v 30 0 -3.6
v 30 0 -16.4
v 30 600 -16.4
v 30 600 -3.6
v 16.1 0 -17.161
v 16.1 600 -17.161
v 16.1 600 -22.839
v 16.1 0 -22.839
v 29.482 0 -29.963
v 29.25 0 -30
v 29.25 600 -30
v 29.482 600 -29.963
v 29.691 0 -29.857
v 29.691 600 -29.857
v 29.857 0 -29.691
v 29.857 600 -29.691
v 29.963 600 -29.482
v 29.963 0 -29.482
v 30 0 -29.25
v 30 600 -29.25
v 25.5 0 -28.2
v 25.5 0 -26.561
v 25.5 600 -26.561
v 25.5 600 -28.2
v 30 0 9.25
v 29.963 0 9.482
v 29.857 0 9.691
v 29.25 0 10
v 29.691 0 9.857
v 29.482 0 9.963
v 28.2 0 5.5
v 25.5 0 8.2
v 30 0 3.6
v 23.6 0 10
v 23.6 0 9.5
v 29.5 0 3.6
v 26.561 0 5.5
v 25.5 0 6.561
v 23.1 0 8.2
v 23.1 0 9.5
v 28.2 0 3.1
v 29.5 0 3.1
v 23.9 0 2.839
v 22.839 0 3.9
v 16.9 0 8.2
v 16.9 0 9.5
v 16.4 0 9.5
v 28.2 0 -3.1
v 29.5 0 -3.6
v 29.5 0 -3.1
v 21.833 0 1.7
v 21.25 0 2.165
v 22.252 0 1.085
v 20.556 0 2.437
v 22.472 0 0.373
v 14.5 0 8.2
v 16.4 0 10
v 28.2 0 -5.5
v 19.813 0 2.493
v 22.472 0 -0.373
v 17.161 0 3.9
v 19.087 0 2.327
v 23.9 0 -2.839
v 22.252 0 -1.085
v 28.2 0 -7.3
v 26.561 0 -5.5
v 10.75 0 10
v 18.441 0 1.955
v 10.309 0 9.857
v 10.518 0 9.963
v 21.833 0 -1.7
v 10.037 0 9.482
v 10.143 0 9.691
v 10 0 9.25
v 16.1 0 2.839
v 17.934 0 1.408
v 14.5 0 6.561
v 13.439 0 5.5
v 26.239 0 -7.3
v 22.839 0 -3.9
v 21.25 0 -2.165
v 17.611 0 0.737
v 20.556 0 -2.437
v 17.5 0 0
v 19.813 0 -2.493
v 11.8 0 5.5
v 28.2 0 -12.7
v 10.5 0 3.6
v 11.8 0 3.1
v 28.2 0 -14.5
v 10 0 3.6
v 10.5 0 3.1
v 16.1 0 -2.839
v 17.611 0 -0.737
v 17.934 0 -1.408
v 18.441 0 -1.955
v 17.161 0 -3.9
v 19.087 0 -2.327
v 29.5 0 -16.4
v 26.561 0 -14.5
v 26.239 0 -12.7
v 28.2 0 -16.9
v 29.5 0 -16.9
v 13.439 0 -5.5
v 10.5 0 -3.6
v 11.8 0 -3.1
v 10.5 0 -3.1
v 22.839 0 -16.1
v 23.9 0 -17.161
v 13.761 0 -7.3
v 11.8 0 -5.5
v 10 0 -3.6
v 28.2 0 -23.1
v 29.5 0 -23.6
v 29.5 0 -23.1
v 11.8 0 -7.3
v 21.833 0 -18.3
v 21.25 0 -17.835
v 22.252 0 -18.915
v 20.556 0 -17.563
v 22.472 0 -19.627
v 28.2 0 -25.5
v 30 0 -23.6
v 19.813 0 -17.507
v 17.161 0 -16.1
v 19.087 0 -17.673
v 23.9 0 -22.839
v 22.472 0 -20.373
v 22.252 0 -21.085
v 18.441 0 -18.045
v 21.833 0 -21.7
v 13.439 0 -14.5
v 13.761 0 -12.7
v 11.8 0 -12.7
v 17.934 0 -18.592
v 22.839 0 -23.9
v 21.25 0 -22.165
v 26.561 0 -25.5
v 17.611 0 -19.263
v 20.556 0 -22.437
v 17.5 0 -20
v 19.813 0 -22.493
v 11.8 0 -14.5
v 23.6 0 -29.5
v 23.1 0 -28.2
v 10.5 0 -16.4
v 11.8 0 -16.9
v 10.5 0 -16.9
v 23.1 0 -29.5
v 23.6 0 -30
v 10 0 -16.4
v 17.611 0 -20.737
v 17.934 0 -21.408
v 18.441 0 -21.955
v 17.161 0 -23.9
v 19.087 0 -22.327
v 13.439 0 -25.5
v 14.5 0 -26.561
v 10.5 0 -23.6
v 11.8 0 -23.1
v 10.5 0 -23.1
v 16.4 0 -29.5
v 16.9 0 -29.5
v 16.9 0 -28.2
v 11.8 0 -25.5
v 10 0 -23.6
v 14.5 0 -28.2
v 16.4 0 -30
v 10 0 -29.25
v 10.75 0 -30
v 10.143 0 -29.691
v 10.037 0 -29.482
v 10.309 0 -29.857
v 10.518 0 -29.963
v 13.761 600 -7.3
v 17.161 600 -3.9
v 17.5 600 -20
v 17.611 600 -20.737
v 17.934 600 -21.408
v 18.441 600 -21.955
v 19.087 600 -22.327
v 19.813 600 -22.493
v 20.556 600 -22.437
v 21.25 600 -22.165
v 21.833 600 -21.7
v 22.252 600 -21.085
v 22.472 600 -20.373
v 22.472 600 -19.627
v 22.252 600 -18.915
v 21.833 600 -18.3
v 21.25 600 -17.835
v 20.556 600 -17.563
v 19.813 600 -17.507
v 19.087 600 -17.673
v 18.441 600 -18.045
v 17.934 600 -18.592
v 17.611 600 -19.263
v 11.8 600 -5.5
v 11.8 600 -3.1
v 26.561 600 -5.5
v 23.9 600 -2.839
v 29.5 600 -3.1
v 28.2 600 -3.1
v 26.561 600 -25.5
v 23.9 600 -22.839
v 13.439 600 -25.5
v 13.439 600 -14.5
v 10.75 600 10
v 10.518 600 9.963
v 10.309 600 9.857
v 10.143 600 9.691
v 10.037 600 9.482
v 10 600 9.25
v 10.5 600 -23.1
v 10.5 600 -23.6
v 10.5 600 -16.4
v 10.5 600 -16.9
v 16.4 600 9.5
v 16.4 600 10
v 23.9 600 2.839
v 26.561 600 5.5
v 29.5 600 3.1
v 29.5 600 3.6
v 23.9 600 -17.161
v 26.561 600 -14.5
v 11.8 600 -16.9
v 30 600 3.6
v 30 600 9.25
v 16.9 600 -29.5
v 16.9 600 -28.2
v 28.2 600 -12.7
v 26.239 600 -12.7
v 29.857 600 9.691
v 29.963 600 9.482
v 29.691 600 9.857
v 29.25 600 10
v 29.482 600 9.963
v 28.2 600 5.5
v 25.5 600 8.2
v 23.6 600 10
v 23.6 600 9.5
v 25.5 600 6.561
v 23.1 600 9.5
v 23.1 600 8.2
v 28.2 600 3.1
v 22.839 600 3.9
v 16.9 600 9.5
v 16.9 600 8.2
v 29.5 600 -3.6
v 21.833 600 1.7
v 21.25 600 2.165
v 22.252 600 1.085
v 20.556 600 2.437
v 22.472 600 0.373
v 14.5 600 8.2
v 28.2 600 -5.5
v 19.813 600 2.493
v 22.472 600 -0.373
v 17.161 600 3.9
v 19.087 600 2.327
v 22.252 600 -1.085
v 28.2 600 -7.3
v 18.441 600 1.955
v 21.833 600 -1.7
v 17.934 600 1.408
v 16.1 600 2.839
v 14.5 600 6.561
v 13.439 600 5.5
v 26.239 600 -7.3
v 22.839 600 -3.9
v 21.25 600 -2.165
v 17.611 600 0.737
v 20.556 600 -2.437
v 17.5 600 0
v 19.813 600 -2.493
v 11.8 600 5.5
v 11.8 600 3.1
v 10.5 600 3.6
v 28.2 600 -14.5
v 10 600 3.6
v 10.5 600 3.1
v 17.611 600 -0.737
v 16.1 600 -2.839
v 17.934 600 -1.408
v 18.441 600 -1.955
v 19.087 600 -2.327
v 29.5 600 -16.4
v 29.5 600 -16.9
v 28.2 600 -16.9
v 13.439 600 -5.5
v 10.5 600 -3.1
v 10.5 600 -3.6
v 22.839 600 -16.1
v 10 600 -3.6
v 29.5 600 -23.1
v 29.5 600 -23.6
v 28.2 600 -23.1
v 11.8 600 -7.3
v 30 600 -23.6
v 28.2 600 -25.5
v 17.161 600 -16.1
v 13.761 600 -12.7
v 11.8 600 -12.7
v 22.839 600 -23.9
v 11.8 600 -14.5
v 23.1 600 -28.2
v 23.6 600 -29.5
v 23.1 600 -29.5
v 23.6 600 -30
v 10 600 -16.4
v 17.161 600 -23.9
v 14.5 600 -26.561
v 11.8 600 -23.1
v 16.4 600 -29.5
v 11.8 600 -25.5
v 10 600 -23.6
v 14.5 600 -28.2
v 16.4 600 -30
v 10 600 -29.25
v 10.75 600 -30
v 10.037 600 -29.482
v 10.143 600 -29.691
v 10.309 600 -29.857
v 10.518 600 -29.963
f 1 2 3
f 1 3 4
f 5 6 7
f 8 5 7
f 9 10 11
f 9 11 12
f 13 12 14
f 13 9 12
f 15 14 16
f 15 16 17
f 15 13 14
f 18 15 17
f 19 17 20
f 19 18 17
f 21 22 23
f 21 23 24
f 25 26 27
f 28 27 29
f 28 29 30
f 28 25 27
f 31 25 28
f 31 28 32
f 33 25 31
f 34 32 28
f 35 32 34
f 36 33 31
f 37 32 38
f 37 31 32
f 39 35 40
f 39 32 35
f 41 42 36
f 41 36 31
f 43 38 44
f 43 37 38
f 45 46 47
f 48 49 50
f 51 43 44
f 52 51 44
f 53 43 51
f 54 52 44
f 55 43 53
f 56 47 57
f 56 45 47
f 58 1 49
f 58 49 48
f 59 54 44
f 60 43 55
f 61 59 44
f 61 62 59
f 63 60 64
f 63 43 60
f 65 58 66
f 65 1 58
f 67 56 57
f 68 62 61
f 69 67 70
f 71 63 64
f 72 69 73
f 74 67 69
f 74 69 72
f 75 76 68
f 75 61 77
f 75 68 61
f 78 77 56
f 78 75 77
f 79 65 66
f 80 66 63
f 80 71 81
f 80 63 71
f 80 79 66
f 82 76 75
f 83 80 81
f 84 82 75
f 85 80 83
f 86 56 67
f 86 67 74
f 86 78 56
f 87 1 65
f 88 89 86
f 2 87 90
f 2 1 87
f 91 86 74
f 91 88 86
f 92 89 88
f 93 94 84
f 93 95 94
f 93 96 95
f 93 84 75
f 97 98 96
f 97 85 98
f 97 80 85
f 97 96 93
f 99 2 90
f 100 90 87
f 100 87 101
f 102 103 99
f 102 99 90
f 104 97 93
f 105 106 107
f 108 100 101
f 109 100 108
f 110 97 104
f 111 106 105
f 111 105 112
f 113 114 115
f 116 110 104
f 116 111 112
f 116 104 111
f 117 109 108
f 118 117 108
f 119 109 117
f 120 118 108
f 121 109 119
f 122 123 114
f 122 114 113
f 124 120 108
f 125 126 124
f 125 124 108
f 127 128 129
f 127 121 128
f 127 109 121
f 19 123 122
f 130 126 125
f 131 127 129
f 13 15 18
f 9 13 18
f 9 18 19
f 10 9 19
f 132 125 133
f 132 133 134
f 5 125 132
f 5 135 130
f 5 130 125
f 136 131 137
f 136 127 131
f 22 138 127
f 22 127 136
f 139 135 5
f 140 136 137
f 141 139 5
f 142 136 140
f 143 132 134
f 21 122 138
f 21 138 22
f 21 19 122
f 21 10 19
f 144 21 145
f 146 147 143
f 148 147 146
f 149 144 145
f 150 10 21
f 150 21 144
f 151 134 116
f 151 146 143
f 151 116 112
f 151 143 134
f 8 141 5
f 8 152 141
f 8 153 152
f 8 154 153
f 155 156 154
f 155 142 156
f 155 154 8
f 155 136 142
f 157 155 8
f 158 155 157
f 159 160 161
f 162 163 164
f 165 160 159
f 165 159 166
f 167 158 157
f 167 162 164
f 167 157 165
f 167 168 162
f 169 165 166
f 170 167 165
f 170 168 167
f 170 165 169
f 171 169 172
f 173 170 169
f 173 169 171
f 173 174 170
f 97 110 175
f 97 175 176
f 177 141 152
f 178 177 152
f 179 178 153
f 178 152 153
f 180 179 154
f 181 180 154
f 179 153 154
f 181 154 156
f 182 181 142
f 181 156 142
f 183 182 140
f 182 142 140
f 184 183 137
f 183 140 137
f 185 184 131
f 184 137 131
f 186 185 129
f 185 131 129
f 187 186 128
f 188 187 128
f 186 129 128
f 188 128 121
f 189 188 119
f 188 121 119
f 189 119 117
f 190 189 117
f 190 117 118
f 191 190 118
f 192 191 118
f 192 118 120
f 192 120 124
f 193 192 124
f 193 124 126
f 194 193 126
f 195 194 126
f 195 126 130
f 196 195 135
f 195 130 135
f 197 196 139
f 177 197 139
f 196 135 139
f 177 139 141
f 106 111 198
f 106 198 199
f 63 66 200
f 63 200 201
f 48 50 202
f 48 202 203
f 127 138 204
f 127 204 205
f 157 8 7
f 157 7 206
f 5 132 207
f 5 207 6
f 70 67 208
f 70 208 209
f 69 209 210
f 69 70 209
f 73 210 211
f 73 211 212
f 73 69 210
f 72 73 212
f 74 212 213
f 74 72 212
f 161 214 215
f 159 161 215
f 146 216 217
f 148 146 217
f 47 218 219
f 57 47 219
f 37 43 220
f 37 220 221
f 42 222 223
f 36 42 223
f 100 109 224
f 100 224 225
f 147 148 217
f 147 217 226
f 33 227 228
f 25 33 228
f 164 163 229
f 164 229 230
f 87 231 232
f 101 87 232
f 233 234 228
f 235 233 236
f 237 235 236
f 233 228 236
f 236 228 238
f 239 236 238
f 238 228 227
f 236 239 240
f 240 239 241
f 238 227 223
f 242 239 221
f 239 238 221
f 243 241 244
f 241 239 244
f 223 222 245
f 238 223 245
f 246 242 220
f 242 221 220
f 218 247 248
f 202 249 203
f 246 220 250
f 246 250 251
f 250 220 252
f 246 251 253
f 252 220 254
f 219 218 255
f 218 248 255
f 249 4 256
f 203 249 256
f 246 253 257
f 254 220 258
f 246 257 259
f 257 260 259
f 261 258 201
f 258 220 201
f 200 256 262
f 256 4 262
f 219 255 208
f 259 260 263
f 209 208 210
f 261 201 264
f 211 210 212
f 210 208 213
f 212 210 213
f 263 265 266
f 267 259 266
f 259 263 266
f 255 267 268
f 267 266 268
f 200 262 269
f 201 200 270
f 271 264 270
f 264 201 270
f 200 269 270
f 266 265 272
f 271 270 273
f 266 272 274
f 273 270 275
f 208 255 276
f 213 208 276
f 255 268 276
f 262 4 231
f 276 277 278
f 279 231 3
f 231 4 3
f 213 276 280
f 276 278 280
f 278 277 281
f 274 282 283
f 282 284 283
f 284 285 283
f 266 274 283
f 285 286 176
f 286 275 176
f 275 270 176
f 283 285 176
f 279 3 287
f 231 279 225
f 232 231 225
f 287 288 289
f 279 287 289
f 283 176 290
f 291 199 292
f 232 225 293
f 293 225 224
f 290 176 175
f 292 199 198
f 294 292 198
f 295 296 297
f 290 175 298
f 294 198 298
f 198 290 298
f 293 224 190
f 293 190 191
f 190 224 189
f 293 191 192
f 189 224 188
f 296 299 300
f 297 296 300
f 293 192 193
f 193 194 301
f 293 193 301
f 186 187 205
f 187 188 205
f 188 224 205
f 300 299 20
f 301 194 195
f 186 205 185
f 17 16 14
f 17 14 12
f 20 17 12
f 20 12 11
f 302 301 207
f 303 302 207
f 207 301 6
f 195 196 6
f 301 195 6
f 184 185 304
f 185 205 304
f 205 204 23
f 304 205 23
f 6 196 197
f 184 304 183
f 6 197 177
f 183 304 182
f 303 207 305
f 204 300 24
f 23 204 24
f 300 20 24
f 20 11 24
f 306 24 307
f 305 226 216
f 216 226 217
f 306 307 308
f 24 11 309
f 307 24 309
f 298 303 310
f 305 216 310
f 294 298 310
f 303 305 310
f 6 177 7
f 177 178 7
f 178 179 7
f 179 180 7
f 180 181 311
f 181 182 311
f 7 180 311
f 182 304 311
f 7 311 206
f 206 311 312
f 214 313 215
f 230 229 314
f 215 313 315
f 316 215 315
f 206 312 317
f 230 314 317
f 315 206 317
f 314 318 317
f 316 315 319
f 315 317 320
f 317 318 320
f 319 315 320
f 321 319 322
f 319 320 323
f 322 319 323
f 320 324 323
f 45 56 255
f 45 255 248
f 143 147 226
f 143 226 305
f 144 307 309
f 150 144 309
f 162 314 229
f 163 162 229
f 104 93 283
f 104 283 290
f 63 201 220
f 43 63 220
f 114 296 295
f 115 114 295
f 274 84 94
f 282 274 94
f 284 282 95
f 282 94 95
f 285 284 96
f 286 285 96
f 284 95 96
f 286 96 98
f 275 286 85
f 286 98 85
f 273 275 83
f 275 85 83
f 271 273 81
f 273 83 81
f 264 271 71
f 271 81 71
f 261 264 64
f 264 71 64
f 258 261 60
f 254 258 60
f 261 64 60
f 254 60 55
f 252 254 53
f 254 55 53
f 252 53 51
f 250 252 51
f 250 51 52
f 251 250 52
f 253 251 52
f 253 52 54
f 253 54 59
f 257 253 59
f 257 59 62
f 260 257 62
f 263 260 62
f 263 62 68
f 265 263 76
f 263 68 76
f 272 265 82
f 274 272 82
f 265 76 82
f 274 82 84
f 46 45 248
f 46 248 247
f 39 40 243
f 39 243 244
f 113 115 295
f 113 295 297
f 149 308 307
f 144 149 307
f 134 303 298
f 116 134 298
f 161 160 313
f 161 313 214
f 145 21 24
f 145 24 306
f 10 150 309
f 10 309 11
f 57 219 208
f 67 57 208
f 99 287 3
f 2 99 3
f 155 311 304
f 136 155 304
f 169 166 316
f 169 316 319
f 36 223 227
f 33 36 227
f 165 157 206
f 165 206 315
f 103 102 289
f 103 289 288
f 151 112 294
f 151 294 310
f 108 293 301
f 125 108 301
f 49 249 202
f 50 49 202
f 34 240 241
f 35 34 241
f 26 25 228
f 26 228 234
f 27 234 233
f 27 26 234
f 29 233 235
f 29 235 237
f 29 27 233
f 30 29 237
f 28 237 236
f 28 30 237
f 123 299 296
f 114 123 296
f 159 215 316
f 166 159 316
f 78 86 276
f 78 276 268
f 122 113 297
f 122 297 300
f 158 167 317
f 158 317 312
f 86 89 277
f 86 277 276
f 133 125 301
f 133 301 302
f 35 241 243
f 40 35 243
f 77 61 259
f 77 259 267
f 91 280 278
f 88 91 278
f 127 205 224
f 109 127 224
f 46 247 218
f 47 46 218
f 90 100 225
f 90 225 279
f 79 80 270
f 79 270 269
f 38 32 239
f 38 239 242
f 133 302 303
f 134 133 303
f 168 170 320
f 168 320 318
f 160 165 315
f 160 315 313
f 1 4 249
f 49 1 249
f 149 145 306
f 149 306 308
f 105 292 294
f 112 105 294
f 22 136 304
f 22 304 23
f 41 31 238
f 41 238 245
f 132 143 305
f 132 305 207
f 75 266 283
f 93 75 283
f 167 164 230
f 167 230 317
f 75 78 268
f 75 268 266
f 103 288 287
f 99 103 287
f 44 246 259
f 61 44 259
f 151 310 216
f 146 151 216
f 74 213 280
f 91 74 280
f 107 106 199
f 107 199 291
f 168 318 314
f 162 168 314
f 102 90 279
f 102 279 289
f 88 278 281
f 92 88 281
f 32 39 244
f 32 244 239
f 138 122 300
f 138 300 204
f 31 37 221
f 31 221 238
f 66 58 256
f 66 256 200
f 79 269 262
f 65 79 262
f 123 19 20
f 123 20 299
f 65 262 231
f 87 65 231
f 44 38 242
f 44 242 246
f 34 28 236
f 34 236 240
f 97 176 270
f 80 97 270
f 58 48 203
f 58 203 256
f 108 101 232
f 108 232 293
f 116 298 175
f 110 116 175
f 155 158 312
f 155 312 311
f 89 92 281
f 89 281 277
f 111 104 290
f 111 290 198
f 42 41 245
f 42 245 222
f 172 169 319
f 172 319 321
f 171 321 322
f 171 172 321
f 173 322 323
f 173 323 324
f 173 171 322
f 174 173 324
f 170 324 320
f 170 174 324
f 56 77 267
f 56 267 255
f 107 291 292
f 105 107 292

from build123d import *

# Parameters (mm, degrees)
BOSS_EXTRUDE2_DEPTH = 600


with BuildPart() as part:
    # Sketch1 → Boss-Extrude2 (new body)
    with BuildSketch(Plane(origin=(0, 0, 0), x_dir=(1, 0, 0), z_dir=(0, 1, 0))):
        with BuildLine():
            Line((23.9, 20), (23.9, 17.160660172))
            Line((23.9, 17.160660172), (26.560660172, 14.5))
            Line((26.560660172, 14.5), (28.2, 14.5))
            Line((28.2, 14.5), (28.2, 16.9))
            Line((28.2, 16.9), (29.5, 16.9))
            Line((29.5, 16.9), (29.5, 16.4))
            Line((29.5, 16.4), (30, 16.4))
            Line((30, 16.4), (30, 10.75))
            Line((30, 10.75), (30, 9.25))
            Line((30, 9.25), (30, 3.6))
            Line((30, 3.6), (29.5, 3.6))
            Line((29.5, 3.6), (29.5, 3.1))
            Line((29.5, 3.1), (28.2, 3.1))
            Line((28.2, 3.1), (28.2, 5.5))
            Line((28.2, 5.5), (26.560660172, 5.5))
            Line((26.560660172, 5.5), (23.9, 2.839339828))
            Line((23.9, 2.839339828), (23.9, 0))
            Line((23.9, 0), (23.9, -2.839339828))
            Line((23.9, -2.839339828), (26.560660172, -5.5))
            Line((26.560660172, -5.5), (28.2, -5.5))
            Line((28.2, -5.5), (28.2, -3.1))
            Line((28.2, -3.1), (29.5, -3.1))
            Line((29.5, -3.1), (29.5, -3.6))
            Line((29.5, -3.6), (30, -3.6))
            Line((30, -3.6), (30, -9.25))
            ThreePointArc((30, -9.25), (29.780330086, -9.780330086), (29.25, -10))
            Line((29.25, -10), (25.5, -10))
            Line((25.5, -10), (23.6, -10))
            Line((23.6, -10), (23.6, -9.5))
            Line((23.6, -9.5), (23.1, -9.5))
            Line((23.1, -9.5), (23.1, -8.2))
            Line((23.1, -8.2), (25.5, -8.2))
            Line((25.5, -8.2), (25.5, -6.560660172))
            Line((25.5, -6.560660172), (22.839339828, -3.9))
            Line((22.839339828, -3.9), (17.160660172, -3.9))
            Line((17.160660172, -3.9), (14.5, -6.560660172))
            Line((14.5, -6.560660172), (14.5, -8.2))
            Line((14.5, -8.2), (16.9, -8.2))
            Line((16.9, -8.2), (16.9, -9.5))
            Line((16.9, -9.5), (16.4, -9.5))
            Line((16.4, -9.5), (16.4, -10))
            Line((16.4, -10), (14.5, -10))
            Line((14.5, -10), (10.75, -10))
            ThreePointArc((10.75, -10), (10.219669914, -9.780330086), (10, -9.25))
            Line((10, -9.25), (10, -3.6))
            Line((10, -3.6), (10.5, -3.6))
            Line((10.5, -3.6), (10.5, -3.1))
            Line((10.5, -3.1), (11.8, -3.1))
            Line((11.8, -3.1), (11.8, -5.5))
            Line((11.8, -5.5), (13.439339828, -5.5))
            Line((13.439339828, -5.5), (16.1, -2.839339828))
            Line((16.1, -2.839339828), (16.1, 0))
            Line((16.1, 0), (16.1, 2.839339828))
            Line((16.1, 2.839339828), (13.439339828, 5.5))
            Line((13.439339828, 5.5), (11.8, 5.5))
            Line((11.8, 5.5), (11.8, 3.1))
            Line((11.8, 3.1), (10.5, 3.1))
            Line((10.5, 3.1), (10.5, 3.6))
            Line((10.5, 3.6), (10, 3.6))
            Line((10, 3.6), (10, 9.25))
            Line((10, 9.25), (10, 10.75))
            Line((10, 10.75), (10, 16.4))
            Line((10, 16.4), (10.5, 16.4))
            Line((10.5, 16.4), (10.5, 16.9))
            Line((10.5, 16.9), (11.8, 16.9))
            Line((11.8, 16.9), (11.8, 14.5))
            Line((11.8, 14.5), (13.439339828, 14.5))
            Line((13.439339828, 14.5), (16.1, 17.160660172))
            Line((16.1, 17.160660172), (16.1, 20))
            Line((16.1, 20), (16.1, 22.839339828))
            Line((16.1, 22.839339828), (13.439339828, 25.5))
            Line((13.439339828, 25.5), (11.8, 25.5))
            Line((11.8, 25.5), (11.8, 23.1))
            Line((11.8, 23.1), (10.5, 23.1))
            Line((10.5, 23.1), (10.5, 23.6))
            Line((10.5, 23.6), (10, 23.6))
            Line((10, 23.6), (10, 29.25))
            ThreePointArc((10, 29.25), (10.219669914, 29.780330086), (10.75, 30))
            Line((10.75, 30), (14.5, 30))
            Line((14.5, 30), (16.4, 30))
            Line((16.4, 30), (16.4, 29.5))
            Line((16.4, 29.5), (16.9, 29.5))
            Line((16.9, 29.5), (16.9, 28.2))
            Line((16.9, 28.2), (14.5, 28.2))
            Line((14.5, 28.2), (14.5, 26.560660172))
            Line((14.5, 26.560660172), (17.160660172, 23.9))
            Line((17.160660172, 23.9), (22.839339828, 23.9))
            Line((22.839339828, 23.9), (25.5, 26.560660172))
            Line((25.5, 26.560660172), (25.5, 28.2))
            Line((25.5, 28.2), (23.1, 28.2))
            Line((23.1, 28.2), (23.1, 29.5))
            Line((23.1, 29.5), (23.6, 29.5))
            Line((23.6, 29.5), (23.6, 30))
            Line((23.6, 30), (25.5, 30))
            Line((25.5, 30), (29.25, 30))
            ThreePointArc((29.25, 30), (29.780330086, 29.780330086), (30, 29.25))
            Line((30, 29.25), (30, 23.6))
            Line((30, 23.6), (29.5, 23.6))
            Line((29.5, 23.6), (29.5, 23.1))
            Line((29.5, 23.1), (28.2, 23.1))
            Line((28.2, 23.1), (28.2, 25.5))
            Line((28.2, 25.5), (26.560660172, 25.5))
            Line((26.560660172, 25.5), (23.9, 22.839339828))
            Line((23.9, 22.839339828), (23.9, 20))
        make_face()
        Polygon((17.160660172, 16.1), (13.760660172, 12.7), (11.8, 12.7), (11.8, 7.3), (13.760660172, 7.3), (17.160660172, 3.9), (22.839339828, 3.9), (26.239339828, 7.3), (28.2, 7.3), (28.2, 12.7), (26.239339828, 12.7), (22.839339828, 16.1), align=None, mode=Mode.SUBTRACT)
        with BuildLine():
            ThreePointArc((22.5, 20), (20, 17.5), (17.5, 20))
            ThreePointArc((17.5, 20), (20, 22.5), (22.5, 20))
        make_face(mode=Mode.SUBTRACT)
        with BuildLine():
            ThreePointArc((22.5, 0), (20, -2.5), (17.5, 0))
            ThreePointArc((17.5, 0), (20, 2.5), (22.5, 0))
        make_face(mode=Mode.SUBTRACT)
    extrude(amount=BOSS_EXTRUDE2_DEPTH)


solid = part.part
